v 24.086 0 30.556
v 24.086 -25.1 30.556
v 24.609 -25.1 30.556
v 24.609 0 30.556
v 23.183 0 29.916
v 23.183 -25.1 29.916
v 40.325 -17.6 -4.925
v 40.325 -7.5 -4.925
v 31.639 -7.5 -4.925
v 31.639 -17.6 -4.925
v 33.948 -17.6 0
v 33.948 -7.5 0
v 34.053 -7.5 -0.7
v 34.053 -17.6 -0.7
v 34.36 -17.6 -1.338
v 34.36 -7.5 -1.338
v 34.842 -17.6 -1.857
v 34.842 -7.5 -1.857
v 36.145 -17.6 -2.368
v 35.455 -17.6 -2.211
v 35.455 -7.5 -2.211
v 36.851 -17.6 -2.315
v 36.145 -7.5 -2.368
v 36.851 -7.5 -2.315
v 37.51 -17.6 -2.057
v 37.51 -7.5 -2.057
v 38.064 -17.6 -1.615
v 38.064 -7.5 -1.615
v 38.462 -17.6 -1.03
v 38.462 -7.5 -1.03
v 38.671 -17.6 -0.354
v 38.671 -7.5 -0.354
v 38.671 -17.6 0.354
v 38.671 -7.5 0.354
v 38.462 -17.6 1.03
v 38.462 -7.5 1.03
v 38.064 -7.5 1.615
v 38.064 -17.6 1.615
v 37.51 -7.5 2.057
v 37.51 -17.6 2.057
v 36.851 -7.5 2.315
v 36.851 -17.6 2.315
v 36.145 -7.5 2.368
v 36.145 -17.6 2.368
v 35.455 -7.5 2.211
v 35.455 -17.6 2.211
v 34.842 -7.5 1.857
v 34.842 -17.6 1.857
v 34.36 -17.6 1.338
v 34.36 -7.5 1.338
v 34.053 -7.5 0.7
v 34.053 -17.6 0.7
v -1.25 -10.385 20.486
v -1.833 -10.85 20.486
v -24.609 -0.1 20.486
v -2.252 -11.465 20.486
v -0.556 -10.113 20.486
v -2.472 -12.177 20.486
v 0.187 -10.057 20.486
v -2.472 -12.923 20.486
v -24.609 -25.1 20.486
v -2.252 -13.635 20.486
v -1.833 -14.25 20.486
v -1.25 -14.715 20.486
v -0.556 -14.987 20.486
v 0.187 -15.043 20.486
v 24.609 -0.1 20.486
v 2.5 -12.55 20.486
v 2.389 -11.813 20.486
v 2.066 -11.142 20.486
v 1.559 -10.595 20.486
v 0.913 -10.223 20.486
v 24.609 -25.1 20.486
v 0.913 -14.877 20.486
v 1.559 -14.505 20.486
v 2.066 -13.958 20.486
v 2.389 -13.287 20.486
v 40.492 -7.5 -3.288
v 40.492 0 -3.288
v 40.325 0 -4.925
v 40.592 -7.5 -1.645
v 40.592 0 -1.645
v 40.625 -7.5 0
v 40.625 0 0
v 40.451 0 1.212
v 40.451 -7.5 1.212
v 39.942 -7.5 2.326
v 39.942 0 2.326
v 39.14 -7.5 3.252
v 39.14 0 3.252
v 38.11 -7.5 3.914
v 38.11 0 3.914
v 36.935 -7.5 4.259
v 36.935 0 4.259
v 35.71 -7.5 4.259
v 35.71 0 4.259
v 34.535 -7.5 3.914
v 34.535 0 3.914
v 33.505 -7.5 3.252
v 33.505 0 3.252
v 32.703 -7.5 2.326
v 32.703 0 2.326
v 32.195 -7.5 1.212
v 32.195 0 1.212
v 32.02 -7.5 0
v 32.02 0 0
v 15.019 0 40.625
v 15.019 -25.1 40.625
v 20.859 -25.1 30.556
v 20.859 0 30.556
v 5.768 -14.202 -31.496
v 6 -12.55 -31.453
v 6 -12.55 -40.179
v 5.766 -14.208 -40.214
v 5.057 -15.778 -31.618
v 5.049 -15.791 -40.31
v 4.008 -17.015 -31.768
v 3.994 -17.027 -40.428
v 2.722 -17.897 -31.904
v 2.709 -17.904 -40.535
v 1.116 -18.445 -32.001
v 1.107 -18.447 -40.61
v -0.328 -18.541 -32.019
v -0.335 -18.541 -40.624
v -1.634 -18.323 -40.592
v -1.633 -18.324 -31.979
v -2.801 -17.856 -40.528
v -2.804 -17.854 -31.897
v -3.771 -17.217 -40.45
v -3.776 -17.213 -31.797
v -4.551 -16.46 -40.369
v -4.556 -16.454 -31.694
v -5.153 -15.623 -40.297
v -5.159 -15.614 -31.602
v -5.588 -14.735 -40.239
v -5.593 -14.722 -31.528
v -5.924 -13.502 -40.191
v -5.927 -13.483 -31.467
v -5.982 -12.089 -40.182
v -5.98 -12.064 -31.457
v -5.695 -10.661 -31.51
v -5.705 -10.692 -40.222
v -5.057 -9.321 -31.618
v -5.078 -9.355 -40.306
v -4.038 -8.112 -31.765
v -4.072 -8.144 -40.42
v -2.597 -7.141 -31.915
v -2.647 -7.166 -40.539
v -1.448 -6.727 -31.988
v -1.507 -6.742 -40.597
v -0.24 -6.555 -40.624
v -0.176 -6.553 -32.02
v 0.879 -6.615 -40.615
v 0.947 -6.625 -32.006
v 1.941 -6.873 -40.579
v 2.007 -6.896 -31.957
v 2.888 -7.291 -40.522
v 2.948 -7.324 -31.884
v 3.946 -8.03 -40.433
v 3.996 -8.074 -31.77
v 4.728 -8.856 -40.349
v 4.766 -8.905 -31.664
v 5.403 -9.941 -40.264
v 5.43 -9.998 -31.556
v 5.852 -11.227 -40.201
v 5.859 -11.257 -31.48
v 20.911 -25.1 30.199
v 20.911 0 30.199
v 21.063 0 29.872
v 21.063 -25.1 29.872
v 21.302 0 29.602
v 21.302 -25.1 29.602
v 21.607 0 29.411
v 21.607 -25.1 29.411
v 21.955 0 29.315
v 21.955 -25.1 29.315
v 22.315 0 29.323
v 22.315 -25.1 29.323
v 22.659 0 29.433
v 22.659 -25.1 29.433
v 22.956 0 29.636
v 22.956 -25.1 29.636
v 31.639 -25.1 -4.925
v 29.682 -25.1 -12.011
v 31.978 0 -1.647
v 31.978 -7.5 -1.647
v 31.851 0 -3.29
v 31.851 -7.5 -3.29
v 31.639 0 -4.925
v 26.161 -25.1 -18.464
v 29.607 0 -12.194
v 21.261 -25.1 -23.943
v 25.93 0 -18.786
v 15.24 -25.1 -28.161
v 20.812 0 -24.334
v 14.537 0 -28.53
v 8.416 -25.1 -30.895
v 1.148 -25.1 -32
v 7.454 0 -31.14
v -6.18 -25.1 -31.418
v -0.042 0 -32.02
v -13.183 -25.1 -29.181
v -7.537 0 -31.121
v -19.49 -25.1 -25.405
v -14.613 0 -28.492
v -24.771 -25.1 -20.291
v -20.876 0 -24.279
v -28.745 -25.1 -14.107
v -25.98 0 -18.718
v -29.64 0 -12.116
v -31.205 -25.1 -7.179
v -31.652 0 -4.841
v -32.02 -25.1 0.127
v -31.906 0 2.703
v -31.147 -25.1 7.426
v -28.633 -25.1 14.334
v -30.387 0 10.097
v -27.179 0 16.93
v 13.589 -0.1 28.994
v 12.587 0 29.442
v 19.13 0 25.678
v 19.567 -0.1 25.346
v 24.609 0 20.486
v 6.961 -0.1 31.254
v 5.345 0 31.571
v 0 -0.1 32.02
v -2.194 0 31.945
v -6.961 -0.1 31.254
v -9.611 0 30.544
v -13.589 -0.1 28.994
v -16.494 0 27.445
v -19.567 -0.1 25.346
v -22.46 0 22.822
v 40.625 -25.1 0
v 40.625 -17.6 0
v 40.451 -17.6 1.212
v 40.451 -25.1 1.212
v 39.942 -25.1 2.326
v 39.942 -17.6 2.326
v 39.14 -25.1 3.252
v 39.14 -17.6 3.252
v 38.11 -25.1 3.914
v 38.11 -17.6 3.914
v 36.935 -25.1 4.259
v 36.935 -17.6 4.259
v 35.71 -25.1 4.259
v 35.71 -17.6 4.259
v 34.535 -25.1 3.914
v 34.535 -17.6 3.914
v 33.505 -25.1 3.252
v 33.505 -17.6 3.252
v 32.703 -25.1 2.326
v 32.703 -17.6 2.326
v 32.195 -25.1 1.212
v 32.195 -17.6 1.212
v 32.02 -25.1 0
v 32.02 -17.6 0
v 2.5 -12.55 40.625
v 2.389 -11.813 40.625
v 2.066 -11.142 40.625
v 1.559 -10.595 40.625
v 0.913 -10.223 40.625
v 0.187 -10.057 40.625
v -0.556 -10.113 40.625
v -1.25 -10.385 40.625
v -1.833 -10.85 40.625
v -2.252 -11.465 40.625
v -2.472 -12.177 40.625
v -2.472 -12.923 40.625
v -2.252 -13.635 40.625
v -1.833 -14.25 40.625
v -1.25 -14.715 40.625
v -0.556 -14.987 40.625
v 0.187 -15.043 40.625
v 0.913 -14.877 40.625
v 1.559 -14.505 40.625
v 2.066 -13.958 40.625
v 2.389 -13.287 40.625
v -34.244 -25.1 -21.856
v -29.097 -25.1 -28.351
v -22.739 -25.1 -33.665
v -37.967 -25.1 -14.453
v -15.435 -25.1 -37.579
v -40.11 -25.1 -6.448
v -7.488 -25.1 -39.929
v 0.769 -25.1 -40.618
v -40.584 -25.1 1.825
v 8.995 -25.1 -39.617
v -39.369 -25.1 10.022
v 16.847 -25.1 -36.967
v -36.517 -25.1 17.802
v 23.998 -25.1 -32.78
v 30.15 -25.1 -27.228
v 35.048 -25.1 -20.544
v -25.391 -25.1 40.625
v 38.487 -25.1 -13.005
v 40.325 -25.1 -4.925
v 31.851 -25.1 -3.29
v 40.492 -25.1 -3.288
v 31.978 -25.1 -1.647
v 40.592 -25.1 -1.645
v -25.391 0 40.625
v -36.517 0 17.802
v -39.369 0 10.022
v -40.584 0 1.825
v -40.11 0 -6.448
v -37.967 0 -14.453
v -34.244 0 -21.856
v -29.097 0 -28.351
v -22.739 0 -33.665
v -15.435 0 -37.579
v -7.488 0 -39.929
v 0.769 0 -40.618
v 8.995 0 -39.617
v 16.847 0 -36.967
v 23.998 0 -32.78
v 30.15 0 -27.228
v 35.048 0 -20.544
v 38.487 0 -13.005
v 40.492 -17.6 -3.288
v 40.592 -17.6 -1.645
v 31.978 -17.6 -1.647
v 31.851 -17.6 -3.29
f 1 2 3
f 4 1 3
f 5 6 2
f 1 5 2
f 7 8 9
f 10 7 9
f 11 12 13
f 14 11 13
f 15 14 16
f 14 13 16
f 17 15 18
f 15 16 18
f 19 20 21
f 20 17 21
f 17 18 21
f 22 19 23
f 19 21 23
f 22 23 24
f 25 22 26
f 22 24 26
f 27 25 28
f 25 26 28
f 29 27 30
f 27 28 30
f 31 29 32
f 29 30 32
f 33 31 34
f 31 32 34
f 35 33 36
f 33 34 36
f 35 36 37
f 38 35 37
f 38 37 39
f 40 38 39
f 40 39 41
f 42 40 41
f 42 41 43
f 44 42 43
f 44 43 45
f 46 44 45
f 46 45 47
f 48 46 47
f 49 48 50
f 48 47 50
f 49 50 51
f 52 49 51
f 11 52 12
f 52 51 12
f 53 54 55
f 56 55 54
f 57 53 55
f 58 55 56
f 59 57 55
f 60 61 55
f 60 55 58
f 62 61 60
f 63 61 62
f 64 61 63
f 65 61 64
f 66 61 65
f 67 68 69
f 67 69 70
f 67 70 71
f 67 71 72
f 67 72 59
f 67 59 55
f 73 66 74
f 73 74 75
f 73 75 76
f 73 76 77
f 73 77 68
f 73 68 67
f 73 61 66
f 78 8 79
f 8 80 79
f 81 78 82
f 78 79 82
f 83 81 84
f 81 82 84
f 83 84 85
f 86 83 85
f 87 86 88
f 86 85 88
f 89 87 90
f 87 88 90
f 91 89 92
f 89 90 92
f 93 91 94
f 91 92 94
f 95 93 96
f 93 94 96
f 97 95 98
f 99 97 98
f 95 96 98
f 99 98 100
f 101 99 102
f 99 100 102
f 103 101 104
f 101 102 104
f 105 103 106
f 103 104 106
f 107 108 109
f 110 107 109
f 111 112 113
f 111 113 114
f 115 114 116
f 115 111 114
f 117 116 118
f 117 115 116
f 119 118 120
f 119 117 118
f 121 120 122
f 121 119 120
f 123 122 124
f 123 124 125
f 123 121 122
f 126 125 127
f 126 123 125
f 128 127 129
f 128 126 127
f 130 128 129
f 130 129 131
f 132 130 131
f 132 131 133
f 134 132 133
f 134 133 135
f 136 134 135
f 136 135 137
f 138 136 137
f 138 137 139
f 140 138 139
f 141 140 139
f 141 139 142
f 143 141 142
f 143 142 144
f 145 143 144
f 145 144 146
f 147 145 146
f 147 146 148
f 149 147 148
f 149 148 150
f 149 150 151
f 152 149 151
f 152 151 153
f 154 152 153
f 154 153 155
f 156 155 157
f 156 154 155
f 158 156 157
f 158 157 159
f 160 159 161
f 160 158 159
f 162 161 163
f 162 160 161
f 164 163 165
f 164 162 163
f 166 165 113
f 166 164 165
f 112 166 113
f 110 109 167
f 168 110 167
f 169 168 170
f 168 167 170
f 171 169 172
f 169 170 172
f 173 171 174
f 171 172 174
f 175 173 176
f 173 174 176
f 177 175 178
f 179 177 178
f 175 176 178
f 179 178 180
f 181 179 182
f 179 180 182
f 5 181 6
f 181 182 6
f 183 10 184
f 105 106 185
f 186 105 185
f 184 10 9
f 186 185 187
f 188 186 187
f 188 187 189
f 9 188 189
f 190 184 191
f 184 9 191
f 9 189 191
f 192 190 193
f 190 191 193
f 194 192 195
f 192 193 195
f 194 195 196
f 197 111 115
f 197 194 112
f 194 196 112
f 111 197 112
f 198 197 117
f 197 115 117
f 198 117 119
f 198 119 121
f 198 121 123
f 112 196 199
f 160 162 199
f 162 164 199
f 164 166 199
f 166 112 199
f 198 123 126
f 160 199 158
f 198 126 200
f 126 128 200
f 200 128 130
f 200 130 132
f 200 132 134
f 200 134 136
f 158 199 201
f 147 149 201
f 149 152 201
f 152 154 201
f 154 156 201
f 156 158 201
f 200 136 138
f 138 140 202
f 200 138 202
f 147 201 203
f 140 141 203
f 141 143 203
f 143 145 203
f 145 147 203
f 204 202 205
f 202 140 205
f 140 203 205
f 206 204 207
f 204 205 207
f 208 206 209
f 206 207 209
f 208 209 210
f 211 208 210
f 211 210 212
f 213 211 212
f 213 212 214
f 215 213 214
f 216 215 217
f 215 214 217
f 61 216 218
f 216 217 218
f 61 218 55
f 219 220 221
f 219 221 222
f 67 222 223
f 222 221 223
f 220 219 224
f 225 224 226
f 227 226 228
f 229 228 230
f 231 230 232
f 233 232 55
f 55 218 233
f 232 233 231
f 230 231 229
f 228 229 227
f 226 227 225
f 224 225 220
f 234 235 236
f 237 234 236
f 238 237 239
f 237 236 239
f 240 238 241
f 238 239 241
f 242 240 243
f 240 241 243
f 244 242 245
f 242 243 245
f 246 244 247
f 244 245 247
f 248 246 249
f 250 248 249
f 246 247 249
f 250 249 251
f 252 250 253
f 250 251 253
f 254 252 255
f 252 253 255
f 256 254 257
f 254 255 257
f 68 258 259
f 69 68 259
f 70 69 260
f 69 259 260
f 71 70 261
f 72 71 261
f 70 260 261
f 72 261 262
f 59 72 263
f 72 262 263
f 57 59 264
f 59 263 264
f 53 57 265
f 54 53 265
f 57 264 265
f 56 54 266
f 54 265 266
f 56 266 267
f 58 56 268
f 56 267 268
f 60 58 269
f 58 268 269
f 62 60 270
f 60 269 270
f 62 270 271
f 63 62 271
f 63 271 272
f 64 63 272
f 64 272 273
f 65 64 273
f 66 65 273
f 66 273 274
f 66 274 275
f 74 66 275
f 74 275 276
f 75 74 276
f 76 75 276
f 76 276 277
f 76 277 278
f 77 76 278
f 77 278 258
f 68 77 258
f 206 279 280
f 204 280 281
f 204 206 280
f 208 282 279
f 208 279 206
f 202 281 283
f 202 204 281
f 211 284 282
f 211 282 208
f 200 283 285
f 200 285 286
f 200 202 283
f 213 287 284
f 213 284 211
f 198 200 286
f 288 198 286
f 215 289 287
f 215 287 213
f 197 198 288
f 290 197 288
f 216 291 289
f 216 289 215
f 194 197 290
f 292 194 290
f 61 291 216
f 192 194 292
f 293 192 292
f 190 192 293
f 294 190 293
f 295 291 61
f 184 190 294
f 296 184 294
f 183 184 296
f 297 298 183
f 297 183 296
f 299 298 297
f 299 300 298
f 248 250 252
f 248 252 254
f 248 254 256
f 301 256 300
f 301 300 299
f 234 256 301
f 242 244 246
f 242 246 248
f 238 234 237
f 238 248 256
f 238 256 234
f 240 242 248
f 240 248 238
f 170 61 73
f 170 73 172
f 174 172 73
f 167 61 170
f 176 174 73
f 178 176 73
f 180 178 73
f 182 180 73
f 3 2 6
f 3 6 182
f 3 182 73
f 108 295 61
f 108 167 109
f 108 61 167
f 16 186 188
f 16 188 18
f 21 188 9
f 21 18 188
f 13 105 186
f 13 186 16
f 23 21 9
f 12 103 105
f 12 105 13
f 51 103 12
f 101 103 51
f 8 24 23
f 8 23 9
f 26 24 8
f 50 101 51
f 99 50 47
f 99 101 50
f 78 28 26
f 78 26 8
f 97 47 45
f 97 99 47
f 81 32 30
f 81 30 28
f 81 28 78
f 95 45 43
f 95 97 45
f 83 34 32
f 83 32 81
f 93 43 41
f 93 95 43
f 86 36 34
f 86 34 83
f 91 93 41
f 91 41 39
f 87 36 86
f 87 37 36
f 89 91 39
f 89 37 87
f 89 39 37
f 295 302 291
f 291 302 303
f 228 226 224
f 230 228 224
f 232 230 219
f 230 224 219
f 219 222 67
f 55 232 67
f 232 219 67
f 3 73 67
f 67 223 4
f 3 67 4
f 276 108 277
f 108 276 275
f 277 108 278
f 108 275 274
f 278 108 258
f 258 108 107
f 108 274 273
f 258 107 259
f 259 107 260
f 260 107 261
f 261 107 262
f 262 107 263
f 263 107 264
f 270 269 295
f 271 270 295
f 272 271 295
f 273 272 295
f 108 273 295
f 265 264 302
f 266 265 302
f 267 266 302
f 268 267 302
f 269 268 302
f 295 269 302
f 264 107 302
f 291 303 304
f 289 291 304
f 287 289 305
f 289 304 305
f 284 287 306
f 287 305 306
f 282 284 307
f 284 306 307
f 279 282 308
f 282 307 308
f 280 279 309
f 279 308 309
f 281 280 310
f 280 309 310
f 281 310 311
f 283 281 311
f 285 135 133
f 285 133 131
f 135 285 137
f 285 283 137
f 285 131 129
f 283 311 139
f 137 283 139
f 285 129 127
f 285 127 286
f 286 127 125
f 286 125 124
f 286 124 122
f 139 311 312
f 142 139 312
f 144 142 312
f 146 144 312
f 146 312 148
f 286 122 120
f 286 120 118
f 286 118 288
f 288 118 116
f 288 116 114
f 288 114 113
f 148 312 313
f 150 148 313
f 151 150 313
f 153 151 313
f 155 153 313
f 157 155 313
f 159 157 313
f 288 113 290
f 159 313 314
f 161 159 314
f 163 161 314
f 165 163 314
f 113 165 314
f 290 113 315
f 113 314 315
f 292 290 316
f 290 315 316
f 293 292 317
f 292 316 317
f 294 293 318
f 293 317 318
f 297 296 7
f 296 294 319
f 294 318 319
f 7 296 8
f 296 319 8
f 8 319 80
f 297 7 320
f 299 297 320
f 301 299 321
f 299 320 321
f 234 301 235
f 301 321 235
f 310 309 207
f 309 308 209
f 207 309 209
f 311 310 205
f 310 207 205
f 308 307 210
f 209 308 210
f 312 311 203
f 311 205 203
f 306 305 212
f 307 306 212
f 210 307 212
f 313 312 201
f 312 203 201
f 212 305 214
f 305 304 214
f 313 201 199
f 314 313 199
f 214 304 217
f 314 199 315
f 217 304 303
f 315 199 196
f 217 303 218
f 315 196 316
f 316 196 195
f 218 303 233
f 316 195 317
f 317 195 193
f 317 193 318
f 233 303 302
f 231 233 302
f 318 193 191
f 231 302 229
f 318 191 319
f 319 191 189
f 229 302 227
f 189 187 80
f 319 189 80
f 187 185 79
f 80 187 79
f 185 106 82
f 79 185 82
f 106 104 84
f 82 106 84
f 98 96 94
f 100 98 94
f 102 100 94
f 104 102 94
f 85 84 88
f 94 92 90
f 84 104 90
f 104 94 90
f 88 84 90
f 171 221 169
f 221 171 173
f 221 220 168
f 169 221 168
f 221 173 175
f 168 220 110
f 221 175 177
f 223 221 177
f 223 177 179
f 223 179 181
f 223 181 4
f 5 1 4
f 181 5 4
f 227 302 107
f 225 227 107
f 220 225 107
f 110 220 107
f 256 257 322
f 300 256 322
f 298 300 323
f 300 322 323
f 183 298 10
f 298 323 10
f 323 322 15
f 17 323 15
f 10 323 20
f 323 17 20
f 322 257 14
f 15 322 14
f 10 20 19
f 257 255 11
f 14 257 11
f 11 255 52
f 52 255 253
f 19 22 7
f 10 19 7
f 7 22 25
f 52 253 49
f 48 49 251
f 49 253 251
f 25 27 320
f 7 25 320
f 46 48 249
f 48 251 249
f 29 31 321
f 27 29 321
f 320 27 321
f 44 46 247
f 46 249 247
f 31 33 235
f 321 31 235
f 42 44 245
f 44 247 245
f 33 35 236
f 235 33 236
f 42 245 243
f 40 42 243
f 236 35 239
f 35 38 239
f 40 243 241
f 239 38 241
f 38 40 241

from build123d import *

# Parameters (mm, degrees)
F1_DEPTH  = 7.5
F2_DEPTH  = 17.6
F4_DEPTH  = 7.5
F6_DEPTH  = 25
F7_DEPTH  = 25.1
F8_R      = 2.5
F9_DEPTH  = 121.4
F10_DEPTH = 25.1
F11_R     = 6
F11_R_2   = 2.5
F12_DEPTH = 82
F14_DEPTH = 25.1


# Not quite as in the source:
# - a feature names something its author has since deleted; it is built from what else it names


with BuildPart() as f1:
    # F0 (on Front) → F1 (new body)
    with BuildSketch(Plane.XZ):
        with BuildLine():
            Line((24.609375, 40.625), (-25.390625, 40.625))
            Line((-25.390625, 40.625), (-25.390625, 31.7128804606))
            ThreePointArc((-25.390625, 31.7128804606), (-31.7255791152, 25.3747562511), (-36.5168539326, 17.8019662921))
            ThreePointArc((-36.5168539326, 17.8019662921), (-11.5217513517, -38.9568976022), (40.3254101185, -4.924624227))
            Line((40.3254101185, -4.924624227), (31.6393058234, -4.924624227))
            ThreePointArc((31.6393058234, -4.924624227), (-30.8610352871, -8.5378040369), (24.609375, 20.4860015345))
            Line((24.609375, 20.4860015345), (24.609375, 32.3228910698))
            Line((24.609375, 32.3228910698), (24.609375, 40.625))
        make_face()
        with BuildLine():
            Line((31.6393058234, -4.924624227), (40.3254101185, -4.924624227))
            ThreePointArc((40.3254101185, -4.924624227), (40.5500333604, -2.4668642988), (40.625, 0))
            ThreePointArc((40.625, 0), (36.3226342652, -4.3023657348), (32.0202685305, 0))
            ThreePointArc((32.0202685305, 0), (31.9248857895, -2.469668822), (31.6393058234, -4.924624227))
        make_face()
        with BuildLine():
            Line((38.6976342652, 0), (40.625, 0))
            ThreePointArc((40.625, 0), (36.3226342652, 4.3023657348), (32.0202685305, 0))
            Line((32.0202685305, 0), (33.9476342652, 0))
            ThreePointArc((33.9476342652, 0), (36.3226342652, 2.375), (38.6976342652, 0))
        make_face()
        with BuildLine():
            ThreePointArc((32.0202685305, 0), (36.3226342652, -4.3023657348), (40.625, 0))
            Line((40.625, 0), (38.6976342652, 0))
            ThreePointArc((38.6976342652, 0), (36.3226342652, -2.375), (33.9476342652, 0))
            Line((33.9476342652, 0), (32.0202685305, 0))
        make_face()
    extrude(amount=F1_DEPTH)

    # F0 (on Front) → F2 (join)
    with BuildSketch(Plane.XZ):
        with BuildLine():
            Line((24.609375, 40.625), (-25.390625, 40.625))
            Line((-25.390625, 40.625), (-25.390625, 31.7128804606))
            ThreePointArc((-25.390625, 31.7128804606), (-31.7255791152, 25.3747562511), (-36.5168539326, 17.8019662921))
            ThreePointArc((-36.5168539326, 17.8019662921), (-11.5217513517, -38.9568976022), (40.3254101185, -4.924624227))
            Line((40.3254101185, -4.924624227), (31.6393058234, -4.924624227))
            ThreePointArc((31.6393058234, -4.924624227), (-30.8610352871, -8.5378040369), (24.609375, 20.4860015345))
            Line((24.609375, 20.4860015345), (24.609375, 32.3228910698))
            Line((24.609375, 32.3228910698), (24.609375, 40.625))
        make_face()
    extrude(amount=F2_DEPTH)

    # F3 (on face) → F4 (join)
    with BuildSketch(Plane.XZ.offset(17.6)):
        with BuildLine():
            Line((24.609375, 40.625), (-25.390625, 40.625))
            Line((-25.390625, 40.625), (-25.390625, 31.7128804606))
            ThreePointArc((-25.390625, 31.7128804606), (-19.7822809369, -35.4831225505), (40.3254101185, -4.924624227))
            Line((40.3254101185, -4.924624227), (31.6393058234, -4.924624227))
            ThreePointArc((31.6393058234, -4.924624227), (-30.8610352871, -8.5378040369), (24.609375, 20.4860015345))
            Line((24.609375, 20.4860015345), (24.609375, 32.3228910698))
            Line((24.609375, 32.3228910698), (24.609375, 40.625))
        make_face()
        with BuildLine():
            Line((31.6393058234, -4.924624227), (40.3254101185, -4.924624227))
            ThreePointArc((40.3254101185, -4.924624227), (40.5500333604, -2.4668642988), (40.625, 0))
            ThreePointArc((40.625, 0), (36.3226342652, -4.3023657348), (32.0202685305, 0))
            ThreePointArc((32.0202685305, 0), (31.9248857895, -2.469668822), (31.6393058234, -4.924624227))
        make_face()
        with BuildLine():
            ThreePointArc((32.0202685305, 0), (36.3226342652, -4.3023657348), (40.625, 0))
            Line((40.625, 0), (38.6976342652, 0))
            ThreePointArc((38.6976342652, 0), (36.3226342652, -2.375), (33.9476342652, 0))
            Line((33.9476342652, 0), (32.0202685305, 0))
        make_face()
        with BuildLine():
            Line((38.6976342652, 0), (40.625, 0))
            ThreePointArc((40.625, 0), (36.3226342652, 4.3023657348), (32.0202685305, 0))
            Line((32.0202685305, 0), (33.9476342652, 0))
            ThreePointArc((33.9476342652, 0), (36.3226342652, 2.375), (38.6976342652, 0))
        make_face()
    extrude(amount=F4_DEPTH)

    # F5 (on face) → F6 (join)
    with BuildSketch(Plane.XZ.offset(25.1)):
        with BuildLine():
            Line((-24.609375, 20.4860015345), (24.609375, 20.4860015345))
            ThreePointArc((24.609375, 20.4860015345), (0, 32.0202685305), (-24.609375, 20.4860015345))
        make_face()
    extrude(amount=-F6_DEPTH)

    # F0 (on Front) → F7 (join)
    with BuildSketch(Plane.XZ):
        with BuildLine():
            Line((33.9476342652, 0), (38.6976342652, 0))
            ThreePointArc((38.6976342652, 0), (36.3226342652, 2.375), (33.9476342652, 0))
        make_face()
        with BuildLine():
            ThreePointArc((33.9476342652, 0), (36.3226342652, -2.375), (38.6976342652, 0))
            Line((38.6976342652, 0), (33.9476342652, 0))
        make_face()
    extrude(amount=F7_DEPTH)

    # F8 (on face) → F9 (cut)
    with BuildSketch(Plane.XY.offset(40.625)):
        with Locations((0, -12.55)):
            Circle(F8_R)
    extrude(amount=-F9_DEPTH, mode=Mode.SUBTRACT)

    # F0 (on Front) → F10 (join)
    with BuildSketch(Plane.XZ):
        with BuildLine():
            Line((-25.390625, 31.7128804606), (-25.390625, 40.625))
            Line((-25.390625, 40.625), (-36.5168539326, 17.8019662921))
            ThreePointArc((-36.5168539326, 17.8019662921), (-31.7255791152, 25.3747562511), (-25.390625, 31.7128804606))
        make_face()
    extrude(amount=F10_DEPTH)

    # F11 (on face) → F12 (cut)
    with BuildSketch(Plane(origin=(0, 0, 20.4860015345), x_dir=(1, 0, 0), z_dir=(0, 0, -1))):
        with Locations((0, 12.55)):
            Circle(F11_R)
        with Locations((0, 12.55)):
            Circle(F11_R_2, mode=Mode.SUBTRACT)
    extrude(amount=F12_DEPTH, mode=Mode.SUBTRACT)

    # F13 (on face) → F14 (cut)
    with BuildSketch(Plane.XZ.offset(25.1)):
        with BuildLine():
            ThreePointArc((23.1832968576, 29.9158197188), (23.3145518173, 30.2237646688), (23.359375, 30.5555007673))
            ThreePointArc((23.359375, 30.5555007673), (22.109375, 31.8055007673), (20.859375, 30.5555007673))
            ThreePointArc((20.859375, 30.5555007673), (21.7776389015, 29.35032395), (23.1832968576, 29.9158197188))
        make_face()
        with BuildLine():
            Line((24.085752666, 30.5555007673), (23.359375, 30.5555007673))
            ThreePointArc((23.359375, 30.5555007673), (23.3145518173, 30.2237646688), (23.1832968576, 29.9158197188))
            Line((23.1832968576, 29.9158197188), (24.085752666, 30.5555007673))
        make_face()
        with BuildLine():
            ThreePointArc((20.859375, 30.5555007673), (22.109375, 31.8055007673), (23.359375, 30.5555007673))
            Line((23.359375, 30.5555007673), (24.085752666, 30.5555007673))
            Line((24.085752666, 30.5555007673), (24.609375, 30.5555007673))
            Line((24.609375, 30.5555007673), (24.609375, 40.625))
            Line((24.609375, 40.625), (15.0185888633, 40.625))
            Line((15.0185888633, 40.625), (20.859375, 30.5555007673))
        make_face()
    extrude(amount=-F14_DEPTH, mode=Mode.SUBTRACT)


solid = f1.part
